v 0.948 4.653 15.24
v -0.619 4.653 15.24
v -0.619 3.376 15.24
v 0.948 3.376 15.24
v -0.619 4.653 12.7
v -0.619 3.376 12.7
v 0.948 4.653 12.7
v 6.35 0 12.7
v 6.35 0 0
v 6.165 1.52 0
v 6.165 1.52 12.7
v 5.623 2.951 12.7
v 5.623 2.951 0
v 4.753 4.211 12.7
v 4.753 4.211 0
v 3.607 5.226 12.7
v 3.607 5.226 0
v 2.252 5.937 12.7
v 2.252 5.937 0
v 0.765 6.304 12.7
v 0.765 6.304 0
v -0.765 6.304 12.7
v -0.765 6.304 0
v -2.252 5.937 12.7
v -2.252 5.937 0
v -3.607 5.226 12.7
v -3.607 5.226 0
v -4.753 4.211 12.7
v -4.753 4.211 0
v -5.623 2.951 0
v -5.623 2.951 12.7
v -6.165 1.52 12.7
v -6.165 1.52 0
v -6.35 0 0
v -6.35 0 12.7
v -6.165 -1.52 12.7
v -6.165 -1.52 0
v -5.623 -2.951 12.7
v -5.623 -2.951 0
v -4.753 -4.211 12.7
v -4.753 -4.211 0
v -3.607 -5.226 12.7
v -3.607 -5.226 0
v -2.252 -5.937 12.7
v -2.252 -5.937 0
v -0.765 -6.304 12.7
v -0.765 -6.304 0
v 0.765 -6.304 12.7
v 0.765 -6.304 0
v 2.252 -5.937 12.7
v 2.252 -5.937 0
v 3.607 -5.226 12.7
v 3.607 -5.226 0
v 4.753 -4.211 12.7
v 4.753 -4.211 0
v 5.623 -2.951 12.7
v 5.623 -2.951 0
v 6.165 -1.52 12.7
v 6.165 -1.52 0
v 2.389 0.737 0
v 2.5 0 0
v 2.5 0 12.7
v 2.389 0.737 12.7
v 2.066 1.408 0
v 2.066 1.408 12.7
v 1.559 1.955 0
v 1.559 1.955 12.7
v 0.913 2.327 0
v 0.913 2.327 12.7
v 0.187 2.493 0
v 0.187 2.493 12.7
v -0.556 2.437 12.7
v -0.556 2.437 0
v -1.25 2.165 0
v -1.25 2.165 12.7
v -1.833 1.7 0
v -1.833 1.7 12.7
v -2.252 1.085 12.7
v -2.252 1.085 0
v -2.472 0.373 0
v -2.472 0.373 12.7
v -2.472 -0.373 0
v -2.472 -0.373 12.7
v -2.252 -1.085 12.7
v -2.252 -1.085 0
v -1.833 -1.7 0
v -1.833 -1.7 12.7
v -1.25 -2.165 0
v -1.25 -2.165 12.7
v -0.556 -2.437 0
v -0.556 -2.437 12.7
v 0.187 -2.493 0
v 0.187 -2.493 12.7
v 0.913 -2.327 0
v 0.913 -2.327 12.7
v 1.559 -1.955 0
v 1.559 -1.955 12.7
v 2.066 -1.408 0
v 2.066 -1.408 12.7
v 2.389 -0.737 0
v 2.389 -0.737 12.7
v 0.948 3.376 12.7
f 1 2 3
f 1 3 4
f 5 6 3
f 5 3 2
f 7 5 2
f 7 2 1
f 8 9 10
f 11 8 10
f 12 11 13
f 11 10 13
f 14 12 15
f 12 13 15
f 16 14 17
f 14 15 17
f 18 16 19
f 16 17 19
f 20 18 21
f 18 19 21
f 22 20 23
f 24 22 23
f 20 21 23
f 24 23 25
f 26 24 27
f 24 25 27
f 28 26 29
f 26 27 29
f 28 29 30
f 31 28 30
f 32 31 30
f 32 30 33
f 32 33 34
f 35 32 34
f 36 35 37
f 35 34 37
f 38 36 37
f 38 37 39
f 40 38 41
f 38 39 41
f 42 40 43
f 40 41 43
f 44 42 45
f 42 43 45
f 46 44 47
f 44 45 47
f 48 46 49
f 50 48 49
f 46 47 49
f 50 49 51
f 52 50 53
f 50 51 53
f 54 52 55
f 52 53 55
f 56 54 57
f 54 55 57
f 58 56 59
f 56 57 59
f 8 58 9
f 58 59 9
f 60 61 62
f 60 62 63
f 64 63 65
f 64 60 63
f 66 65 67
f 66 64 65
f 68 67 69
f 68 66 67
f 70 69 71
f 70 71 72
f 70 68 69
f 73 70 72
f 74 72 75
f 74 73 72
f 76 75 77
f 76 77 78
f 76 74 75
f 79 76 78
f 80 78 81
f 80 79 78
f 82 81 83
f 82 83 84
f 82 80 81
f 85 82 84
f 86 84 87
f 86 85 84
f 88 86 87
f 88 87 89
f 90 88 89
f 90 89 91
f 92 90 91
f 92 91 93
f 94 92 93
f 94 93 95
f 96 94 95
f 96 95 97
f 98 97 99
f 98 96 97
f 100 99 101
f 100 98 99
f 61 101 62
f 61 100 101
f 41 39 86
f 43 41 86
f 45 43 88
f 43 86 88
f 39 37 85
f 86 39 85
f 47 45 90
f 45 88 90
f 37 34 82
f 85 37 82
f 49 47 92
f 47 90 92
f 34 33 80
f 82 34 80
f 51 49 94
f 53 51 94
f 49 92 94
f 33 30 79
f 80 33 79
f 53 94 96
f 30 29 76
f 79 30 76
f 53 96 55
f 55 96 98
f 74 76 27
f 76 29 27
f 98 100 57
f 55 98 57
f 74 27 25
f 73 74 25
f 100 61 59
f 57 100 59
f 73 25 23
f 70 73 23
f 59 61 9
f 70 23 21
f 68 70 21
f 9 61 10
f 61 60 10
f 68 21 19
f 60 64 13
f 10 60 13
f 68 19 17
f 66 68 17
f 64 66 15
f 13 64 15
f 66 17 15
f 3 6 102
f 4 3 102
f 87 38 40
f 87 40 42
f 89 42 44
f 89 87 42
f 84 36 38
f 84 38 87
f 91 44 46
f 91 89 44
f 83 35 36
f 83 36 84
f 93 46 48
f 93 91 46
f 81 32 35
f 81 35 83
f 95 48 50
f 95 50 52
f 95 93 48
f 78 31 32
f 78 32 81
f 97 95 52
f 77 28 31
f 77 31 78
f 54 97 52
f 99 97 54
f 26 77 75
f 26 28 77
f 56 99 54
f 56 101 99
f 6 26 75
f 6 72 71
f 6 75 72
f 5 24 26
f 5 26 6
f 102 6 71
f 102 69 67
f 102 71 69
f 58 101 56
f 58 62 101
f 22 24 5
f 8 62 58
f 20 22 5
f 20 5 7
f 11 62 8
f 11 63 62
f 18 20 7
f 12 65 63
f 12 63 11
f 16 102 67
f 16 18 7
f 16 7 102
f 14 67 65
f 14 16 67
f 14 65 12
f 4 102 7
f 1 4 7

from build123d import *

# Parameters (mm, degrees)
SKETCH1_R           = 6.35
SKETCH1_R_2         = 2.499995
BOSS_EXTRUDE1_DEPTH = 12.7
SKETCH2_W           = 1.567050356
SKETCH2_H           = 1.276855845
BOSS_EXTRUDE2_DEPTH = 2.54


with BuildPart() as part:
    # Sketch1 → Boss-Extrude1 (new body)
    with BuildSketch(Plane.XY):
        Circle(SKETCH1_R)
        Circle(SKETCH1_R_2, mode=Mode.SUBTRACT)
    extrude(amount=BOSS_EXTRUDE1_DEPTH)

    # Sketch2 → Boss-Extrude2 (add)
    with BuildSketch(Plane.XY.offset(12.7)):
        with Locations((0.164443556, 4.014357393)):
            Rectangle(SKETCH2_W, SKETCH2_H)
    extrude(amount=BOSS_EXTRUDE2_DEPTH)


solid = part.part
